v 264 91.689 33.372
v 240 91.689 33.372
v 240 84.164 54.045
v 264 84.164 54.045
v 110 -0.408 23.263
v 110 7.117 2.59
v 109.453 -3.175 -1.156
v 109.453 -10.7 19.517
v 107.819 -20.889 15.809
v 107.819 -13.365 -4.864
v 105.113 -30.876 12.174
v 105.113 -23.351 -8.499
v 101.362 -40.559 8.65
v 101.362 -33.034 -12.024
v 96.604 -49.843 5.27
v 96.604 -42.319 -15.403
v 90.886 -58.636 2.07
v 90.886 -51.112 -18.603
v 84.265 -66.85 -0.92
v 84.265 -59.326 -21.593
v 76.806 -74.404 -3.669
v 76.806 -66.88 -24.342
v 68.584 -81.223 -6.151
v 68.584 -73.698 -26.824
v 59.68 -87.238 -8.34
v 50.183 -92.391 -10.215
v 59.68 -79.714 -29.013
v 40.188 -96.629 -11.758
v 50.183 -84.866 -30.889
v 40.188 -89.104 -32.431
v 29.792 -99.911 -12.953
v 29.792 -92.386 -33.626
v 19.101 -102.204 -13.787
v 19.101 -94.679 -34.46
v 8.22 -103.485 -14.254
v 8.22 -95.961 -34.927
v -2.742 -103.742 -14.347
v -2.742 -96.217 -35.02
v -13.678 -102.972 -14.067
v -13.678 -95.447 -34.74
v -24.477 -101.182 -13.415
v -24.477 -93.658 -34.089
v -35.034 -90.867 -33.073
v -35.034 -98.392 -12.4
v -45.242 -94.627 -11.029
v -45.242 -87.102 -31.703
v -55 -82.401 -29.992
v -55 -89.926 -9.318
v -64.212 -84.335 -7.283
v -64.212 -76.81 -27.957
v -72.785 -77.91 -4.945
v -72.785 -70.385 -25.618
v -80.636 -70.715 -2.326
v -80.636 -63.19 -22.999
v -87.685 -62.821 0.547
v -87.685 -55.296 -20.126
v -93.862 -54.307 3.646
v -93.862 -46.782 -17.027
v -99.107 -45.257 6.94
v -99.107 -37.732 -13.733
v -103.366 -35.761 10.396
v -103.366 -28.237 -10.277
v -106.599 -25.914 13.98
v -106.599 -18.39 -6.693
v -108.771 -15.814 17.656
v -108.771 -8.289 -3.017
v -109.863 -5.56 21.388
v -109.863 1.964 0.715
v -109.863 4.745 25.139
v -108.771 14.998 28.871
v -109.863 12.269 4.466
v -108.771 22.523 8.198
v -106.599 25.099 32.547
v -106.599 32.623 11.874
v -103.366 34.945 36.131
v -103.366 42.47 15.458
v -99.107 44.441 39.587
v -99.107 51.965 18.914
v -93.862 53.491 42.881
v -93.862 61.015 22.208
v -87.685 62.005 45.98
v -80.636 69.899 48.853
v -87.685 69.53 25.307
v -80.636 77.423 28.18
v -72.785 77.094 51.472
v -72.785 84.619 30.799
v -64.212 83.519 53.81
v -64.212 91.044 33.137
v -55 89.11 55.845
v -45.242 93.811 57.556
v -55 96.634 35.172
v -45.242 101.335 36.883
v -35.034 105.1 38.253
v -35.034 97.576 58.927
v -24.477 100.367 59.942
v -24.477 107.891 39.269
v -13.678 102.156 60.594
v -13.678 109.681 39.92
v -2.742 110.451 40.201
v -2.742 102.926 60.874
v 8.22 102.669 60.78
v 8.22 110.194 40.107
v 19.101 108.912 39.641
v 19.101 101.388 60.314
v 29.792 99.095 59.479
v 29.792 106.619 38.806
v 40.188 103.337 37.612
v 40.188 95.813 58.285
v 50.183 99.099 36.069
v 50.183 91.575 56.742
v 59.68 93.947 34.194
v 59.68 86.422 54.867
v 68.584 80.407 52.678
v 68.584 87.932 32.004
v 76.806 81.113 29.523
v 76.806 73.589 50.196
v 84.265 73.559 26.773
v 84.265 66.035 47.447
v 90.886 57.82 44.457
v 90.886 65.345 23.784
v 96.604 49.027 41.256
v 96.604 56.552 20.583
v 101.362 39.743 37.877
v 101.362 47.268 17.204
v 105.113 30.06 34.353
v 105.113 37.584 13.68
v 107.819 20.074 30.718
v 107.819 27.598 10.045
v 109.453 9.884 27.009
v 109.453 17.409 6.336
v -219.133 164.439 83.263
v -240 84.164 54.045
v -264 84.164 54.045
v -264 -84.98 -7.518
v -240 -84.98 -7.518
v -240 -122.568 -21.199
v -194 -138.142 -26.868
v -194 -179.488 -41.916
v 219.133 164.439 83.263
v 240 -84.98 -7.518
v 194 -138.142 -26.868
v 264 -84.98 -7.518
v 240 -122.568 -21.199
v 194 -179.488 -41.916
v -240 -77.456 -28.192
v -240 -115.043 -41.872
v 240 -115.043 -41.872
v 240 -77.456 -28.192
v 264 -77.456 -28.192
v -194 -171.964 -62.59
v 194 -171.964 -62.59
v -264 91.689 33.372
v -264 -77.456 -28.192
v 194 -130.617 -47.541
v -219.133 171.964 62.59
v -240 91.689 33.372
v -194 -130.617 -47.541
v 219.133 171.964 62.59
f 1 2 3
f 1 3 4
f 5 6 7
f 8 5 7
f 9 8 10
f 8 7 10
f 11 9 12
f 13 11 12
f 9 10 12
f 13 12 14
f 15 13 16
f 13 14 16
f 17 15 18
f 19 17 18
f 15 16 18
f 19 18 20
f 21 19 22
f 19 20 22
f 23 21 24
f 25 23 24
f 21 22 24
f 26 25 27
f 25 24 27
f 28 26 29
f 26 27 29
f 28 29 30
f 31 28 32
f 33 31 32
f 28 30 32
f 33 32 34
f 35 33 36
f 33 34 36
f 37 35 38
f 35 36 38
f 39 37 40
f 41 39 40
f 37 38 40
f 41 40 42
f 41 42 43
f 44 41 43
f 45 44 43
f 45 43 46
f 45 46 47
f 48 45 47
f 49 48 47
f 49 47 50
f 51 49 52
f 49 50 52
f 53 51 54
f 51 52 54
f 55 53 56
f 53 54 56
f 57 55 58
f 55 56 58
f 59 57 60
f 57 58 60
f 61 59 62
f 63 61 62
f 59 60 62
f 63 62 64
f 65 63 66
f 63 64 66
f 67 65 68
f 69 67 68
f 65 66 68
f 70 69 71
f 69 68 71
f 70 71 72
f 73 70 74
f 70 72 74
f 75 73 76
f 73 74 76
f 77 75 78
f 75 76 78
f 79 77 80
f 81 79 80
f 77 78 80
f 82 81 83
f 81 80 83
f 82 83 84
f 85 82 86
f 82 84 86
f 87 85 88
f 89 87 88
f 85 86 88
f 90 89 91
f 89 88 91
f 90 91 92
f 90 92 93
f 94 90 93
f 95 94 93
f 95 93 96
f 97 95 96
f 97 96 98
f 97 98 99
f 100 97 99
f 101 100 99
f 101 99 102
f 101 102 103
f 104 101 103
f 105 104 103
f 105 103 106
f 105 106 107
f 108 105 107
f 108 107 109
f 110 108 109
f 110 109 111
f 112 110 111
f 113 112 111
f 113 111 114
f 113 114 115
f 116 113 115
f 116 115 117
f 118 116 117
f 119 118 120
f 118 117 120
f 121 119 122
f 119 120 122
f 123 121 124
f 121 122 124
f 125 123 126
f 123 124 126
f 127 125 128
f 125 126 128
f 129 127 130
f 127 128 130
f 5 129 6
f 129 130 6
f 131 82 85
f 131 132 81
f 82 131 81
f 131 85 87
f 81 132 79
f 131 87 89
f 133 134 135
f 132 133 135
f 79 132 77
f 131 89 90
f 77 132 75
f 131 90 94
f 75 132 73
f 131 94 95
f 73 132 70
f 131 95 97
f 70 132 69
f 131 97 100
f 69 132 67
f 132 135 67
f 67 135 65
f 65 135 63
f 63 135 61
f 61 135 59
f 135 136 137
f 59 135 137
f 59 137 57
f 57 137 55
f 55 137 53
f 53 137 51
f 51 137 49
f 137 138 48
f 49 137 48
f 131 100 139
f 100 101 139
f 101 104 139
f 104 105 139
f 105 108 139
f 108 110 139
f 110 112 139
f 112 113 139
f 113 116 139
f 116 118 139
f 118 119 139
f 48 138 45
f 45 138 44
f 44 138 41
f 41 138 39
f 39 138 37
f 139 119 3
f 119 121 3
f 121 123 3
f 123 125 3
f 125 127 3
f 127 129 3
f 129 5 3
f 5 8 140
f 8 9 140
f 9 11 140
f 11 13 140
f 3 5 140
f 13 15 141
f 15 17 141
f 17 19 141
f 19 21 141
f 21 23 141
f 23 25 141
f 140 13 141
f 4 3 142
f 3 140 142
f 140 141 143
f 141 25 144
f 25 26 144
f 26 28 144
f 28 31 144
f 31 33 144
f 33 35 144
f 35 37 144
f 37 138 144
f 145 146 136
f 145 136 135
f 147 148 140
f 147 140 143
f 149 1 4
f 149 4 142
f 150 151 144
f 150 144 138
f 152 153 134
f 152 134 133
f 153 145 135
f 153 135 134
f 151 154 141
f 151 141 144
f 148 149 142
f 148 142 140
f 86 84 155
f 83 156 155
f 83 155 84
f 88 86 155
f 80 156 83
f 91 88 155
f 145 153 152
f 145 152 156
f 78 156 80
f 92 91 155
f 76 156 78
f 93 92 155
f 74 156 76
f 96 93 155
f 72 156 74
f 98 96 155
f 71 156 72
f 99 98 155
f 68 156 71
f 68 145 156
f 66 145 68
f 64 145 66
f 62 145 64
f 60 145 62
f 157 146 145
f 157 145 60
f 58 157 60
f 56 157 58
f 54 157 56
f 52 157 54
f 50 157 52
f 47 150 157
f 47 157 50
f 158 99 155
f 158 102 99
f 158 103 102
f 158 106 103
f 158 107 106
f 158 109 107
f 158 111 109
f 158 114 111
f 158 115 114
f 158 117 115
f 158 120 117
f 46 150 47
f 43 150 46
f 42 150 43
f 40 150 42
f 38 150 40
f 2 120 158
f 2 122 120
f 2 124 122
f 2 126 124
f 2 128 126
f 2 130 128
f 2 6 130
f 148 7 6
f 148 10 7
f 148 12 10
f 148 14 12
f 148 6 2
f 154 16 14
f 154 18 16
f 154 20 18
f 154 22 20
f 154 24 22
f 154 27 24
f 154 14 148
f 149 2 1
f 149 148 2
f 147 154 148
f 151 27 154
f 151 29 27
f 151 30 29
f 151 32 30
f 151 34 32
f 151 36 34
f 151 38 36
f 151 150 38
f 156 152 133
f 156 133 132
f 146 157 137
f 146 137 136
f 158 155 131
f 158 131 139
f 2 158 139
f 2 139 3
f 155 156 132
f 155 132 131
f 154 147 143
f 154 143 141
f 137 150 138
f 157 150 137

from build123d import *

# Parameters (mm, degrees)
F2_R     = 110
F3_DEPTH = 22


with BuildPart() as f3:
    # F2 (on face) → F3 (new body)
    with BuildSketch(Plane(origin=(0, 0, 0), x_dir=(1, 0, 0), z_dir=(0, 0.34202, -0.939693))):
        Polygon((-194, 183), (-194, 139), (-240, 122.426697), (-240, 82.426697), (-264, 82.426697), (-264, -97.573303), (-240, -97.573303), (-219.132979, -183), (-160, -183), (160, -183), (219.132978, -183), (240, -97.573303), (264, -97.573303), (264, 82.426697), (240, 82.426697), (240, 122.426697), (194, 139), (194, 183), align=None)
        with Locations((0, -7.573303)):
            Circle(F2_R, mode=Mode.SUBTRACT)
    extrude(amount=-F3_DEPTH)


solid = f3.part
